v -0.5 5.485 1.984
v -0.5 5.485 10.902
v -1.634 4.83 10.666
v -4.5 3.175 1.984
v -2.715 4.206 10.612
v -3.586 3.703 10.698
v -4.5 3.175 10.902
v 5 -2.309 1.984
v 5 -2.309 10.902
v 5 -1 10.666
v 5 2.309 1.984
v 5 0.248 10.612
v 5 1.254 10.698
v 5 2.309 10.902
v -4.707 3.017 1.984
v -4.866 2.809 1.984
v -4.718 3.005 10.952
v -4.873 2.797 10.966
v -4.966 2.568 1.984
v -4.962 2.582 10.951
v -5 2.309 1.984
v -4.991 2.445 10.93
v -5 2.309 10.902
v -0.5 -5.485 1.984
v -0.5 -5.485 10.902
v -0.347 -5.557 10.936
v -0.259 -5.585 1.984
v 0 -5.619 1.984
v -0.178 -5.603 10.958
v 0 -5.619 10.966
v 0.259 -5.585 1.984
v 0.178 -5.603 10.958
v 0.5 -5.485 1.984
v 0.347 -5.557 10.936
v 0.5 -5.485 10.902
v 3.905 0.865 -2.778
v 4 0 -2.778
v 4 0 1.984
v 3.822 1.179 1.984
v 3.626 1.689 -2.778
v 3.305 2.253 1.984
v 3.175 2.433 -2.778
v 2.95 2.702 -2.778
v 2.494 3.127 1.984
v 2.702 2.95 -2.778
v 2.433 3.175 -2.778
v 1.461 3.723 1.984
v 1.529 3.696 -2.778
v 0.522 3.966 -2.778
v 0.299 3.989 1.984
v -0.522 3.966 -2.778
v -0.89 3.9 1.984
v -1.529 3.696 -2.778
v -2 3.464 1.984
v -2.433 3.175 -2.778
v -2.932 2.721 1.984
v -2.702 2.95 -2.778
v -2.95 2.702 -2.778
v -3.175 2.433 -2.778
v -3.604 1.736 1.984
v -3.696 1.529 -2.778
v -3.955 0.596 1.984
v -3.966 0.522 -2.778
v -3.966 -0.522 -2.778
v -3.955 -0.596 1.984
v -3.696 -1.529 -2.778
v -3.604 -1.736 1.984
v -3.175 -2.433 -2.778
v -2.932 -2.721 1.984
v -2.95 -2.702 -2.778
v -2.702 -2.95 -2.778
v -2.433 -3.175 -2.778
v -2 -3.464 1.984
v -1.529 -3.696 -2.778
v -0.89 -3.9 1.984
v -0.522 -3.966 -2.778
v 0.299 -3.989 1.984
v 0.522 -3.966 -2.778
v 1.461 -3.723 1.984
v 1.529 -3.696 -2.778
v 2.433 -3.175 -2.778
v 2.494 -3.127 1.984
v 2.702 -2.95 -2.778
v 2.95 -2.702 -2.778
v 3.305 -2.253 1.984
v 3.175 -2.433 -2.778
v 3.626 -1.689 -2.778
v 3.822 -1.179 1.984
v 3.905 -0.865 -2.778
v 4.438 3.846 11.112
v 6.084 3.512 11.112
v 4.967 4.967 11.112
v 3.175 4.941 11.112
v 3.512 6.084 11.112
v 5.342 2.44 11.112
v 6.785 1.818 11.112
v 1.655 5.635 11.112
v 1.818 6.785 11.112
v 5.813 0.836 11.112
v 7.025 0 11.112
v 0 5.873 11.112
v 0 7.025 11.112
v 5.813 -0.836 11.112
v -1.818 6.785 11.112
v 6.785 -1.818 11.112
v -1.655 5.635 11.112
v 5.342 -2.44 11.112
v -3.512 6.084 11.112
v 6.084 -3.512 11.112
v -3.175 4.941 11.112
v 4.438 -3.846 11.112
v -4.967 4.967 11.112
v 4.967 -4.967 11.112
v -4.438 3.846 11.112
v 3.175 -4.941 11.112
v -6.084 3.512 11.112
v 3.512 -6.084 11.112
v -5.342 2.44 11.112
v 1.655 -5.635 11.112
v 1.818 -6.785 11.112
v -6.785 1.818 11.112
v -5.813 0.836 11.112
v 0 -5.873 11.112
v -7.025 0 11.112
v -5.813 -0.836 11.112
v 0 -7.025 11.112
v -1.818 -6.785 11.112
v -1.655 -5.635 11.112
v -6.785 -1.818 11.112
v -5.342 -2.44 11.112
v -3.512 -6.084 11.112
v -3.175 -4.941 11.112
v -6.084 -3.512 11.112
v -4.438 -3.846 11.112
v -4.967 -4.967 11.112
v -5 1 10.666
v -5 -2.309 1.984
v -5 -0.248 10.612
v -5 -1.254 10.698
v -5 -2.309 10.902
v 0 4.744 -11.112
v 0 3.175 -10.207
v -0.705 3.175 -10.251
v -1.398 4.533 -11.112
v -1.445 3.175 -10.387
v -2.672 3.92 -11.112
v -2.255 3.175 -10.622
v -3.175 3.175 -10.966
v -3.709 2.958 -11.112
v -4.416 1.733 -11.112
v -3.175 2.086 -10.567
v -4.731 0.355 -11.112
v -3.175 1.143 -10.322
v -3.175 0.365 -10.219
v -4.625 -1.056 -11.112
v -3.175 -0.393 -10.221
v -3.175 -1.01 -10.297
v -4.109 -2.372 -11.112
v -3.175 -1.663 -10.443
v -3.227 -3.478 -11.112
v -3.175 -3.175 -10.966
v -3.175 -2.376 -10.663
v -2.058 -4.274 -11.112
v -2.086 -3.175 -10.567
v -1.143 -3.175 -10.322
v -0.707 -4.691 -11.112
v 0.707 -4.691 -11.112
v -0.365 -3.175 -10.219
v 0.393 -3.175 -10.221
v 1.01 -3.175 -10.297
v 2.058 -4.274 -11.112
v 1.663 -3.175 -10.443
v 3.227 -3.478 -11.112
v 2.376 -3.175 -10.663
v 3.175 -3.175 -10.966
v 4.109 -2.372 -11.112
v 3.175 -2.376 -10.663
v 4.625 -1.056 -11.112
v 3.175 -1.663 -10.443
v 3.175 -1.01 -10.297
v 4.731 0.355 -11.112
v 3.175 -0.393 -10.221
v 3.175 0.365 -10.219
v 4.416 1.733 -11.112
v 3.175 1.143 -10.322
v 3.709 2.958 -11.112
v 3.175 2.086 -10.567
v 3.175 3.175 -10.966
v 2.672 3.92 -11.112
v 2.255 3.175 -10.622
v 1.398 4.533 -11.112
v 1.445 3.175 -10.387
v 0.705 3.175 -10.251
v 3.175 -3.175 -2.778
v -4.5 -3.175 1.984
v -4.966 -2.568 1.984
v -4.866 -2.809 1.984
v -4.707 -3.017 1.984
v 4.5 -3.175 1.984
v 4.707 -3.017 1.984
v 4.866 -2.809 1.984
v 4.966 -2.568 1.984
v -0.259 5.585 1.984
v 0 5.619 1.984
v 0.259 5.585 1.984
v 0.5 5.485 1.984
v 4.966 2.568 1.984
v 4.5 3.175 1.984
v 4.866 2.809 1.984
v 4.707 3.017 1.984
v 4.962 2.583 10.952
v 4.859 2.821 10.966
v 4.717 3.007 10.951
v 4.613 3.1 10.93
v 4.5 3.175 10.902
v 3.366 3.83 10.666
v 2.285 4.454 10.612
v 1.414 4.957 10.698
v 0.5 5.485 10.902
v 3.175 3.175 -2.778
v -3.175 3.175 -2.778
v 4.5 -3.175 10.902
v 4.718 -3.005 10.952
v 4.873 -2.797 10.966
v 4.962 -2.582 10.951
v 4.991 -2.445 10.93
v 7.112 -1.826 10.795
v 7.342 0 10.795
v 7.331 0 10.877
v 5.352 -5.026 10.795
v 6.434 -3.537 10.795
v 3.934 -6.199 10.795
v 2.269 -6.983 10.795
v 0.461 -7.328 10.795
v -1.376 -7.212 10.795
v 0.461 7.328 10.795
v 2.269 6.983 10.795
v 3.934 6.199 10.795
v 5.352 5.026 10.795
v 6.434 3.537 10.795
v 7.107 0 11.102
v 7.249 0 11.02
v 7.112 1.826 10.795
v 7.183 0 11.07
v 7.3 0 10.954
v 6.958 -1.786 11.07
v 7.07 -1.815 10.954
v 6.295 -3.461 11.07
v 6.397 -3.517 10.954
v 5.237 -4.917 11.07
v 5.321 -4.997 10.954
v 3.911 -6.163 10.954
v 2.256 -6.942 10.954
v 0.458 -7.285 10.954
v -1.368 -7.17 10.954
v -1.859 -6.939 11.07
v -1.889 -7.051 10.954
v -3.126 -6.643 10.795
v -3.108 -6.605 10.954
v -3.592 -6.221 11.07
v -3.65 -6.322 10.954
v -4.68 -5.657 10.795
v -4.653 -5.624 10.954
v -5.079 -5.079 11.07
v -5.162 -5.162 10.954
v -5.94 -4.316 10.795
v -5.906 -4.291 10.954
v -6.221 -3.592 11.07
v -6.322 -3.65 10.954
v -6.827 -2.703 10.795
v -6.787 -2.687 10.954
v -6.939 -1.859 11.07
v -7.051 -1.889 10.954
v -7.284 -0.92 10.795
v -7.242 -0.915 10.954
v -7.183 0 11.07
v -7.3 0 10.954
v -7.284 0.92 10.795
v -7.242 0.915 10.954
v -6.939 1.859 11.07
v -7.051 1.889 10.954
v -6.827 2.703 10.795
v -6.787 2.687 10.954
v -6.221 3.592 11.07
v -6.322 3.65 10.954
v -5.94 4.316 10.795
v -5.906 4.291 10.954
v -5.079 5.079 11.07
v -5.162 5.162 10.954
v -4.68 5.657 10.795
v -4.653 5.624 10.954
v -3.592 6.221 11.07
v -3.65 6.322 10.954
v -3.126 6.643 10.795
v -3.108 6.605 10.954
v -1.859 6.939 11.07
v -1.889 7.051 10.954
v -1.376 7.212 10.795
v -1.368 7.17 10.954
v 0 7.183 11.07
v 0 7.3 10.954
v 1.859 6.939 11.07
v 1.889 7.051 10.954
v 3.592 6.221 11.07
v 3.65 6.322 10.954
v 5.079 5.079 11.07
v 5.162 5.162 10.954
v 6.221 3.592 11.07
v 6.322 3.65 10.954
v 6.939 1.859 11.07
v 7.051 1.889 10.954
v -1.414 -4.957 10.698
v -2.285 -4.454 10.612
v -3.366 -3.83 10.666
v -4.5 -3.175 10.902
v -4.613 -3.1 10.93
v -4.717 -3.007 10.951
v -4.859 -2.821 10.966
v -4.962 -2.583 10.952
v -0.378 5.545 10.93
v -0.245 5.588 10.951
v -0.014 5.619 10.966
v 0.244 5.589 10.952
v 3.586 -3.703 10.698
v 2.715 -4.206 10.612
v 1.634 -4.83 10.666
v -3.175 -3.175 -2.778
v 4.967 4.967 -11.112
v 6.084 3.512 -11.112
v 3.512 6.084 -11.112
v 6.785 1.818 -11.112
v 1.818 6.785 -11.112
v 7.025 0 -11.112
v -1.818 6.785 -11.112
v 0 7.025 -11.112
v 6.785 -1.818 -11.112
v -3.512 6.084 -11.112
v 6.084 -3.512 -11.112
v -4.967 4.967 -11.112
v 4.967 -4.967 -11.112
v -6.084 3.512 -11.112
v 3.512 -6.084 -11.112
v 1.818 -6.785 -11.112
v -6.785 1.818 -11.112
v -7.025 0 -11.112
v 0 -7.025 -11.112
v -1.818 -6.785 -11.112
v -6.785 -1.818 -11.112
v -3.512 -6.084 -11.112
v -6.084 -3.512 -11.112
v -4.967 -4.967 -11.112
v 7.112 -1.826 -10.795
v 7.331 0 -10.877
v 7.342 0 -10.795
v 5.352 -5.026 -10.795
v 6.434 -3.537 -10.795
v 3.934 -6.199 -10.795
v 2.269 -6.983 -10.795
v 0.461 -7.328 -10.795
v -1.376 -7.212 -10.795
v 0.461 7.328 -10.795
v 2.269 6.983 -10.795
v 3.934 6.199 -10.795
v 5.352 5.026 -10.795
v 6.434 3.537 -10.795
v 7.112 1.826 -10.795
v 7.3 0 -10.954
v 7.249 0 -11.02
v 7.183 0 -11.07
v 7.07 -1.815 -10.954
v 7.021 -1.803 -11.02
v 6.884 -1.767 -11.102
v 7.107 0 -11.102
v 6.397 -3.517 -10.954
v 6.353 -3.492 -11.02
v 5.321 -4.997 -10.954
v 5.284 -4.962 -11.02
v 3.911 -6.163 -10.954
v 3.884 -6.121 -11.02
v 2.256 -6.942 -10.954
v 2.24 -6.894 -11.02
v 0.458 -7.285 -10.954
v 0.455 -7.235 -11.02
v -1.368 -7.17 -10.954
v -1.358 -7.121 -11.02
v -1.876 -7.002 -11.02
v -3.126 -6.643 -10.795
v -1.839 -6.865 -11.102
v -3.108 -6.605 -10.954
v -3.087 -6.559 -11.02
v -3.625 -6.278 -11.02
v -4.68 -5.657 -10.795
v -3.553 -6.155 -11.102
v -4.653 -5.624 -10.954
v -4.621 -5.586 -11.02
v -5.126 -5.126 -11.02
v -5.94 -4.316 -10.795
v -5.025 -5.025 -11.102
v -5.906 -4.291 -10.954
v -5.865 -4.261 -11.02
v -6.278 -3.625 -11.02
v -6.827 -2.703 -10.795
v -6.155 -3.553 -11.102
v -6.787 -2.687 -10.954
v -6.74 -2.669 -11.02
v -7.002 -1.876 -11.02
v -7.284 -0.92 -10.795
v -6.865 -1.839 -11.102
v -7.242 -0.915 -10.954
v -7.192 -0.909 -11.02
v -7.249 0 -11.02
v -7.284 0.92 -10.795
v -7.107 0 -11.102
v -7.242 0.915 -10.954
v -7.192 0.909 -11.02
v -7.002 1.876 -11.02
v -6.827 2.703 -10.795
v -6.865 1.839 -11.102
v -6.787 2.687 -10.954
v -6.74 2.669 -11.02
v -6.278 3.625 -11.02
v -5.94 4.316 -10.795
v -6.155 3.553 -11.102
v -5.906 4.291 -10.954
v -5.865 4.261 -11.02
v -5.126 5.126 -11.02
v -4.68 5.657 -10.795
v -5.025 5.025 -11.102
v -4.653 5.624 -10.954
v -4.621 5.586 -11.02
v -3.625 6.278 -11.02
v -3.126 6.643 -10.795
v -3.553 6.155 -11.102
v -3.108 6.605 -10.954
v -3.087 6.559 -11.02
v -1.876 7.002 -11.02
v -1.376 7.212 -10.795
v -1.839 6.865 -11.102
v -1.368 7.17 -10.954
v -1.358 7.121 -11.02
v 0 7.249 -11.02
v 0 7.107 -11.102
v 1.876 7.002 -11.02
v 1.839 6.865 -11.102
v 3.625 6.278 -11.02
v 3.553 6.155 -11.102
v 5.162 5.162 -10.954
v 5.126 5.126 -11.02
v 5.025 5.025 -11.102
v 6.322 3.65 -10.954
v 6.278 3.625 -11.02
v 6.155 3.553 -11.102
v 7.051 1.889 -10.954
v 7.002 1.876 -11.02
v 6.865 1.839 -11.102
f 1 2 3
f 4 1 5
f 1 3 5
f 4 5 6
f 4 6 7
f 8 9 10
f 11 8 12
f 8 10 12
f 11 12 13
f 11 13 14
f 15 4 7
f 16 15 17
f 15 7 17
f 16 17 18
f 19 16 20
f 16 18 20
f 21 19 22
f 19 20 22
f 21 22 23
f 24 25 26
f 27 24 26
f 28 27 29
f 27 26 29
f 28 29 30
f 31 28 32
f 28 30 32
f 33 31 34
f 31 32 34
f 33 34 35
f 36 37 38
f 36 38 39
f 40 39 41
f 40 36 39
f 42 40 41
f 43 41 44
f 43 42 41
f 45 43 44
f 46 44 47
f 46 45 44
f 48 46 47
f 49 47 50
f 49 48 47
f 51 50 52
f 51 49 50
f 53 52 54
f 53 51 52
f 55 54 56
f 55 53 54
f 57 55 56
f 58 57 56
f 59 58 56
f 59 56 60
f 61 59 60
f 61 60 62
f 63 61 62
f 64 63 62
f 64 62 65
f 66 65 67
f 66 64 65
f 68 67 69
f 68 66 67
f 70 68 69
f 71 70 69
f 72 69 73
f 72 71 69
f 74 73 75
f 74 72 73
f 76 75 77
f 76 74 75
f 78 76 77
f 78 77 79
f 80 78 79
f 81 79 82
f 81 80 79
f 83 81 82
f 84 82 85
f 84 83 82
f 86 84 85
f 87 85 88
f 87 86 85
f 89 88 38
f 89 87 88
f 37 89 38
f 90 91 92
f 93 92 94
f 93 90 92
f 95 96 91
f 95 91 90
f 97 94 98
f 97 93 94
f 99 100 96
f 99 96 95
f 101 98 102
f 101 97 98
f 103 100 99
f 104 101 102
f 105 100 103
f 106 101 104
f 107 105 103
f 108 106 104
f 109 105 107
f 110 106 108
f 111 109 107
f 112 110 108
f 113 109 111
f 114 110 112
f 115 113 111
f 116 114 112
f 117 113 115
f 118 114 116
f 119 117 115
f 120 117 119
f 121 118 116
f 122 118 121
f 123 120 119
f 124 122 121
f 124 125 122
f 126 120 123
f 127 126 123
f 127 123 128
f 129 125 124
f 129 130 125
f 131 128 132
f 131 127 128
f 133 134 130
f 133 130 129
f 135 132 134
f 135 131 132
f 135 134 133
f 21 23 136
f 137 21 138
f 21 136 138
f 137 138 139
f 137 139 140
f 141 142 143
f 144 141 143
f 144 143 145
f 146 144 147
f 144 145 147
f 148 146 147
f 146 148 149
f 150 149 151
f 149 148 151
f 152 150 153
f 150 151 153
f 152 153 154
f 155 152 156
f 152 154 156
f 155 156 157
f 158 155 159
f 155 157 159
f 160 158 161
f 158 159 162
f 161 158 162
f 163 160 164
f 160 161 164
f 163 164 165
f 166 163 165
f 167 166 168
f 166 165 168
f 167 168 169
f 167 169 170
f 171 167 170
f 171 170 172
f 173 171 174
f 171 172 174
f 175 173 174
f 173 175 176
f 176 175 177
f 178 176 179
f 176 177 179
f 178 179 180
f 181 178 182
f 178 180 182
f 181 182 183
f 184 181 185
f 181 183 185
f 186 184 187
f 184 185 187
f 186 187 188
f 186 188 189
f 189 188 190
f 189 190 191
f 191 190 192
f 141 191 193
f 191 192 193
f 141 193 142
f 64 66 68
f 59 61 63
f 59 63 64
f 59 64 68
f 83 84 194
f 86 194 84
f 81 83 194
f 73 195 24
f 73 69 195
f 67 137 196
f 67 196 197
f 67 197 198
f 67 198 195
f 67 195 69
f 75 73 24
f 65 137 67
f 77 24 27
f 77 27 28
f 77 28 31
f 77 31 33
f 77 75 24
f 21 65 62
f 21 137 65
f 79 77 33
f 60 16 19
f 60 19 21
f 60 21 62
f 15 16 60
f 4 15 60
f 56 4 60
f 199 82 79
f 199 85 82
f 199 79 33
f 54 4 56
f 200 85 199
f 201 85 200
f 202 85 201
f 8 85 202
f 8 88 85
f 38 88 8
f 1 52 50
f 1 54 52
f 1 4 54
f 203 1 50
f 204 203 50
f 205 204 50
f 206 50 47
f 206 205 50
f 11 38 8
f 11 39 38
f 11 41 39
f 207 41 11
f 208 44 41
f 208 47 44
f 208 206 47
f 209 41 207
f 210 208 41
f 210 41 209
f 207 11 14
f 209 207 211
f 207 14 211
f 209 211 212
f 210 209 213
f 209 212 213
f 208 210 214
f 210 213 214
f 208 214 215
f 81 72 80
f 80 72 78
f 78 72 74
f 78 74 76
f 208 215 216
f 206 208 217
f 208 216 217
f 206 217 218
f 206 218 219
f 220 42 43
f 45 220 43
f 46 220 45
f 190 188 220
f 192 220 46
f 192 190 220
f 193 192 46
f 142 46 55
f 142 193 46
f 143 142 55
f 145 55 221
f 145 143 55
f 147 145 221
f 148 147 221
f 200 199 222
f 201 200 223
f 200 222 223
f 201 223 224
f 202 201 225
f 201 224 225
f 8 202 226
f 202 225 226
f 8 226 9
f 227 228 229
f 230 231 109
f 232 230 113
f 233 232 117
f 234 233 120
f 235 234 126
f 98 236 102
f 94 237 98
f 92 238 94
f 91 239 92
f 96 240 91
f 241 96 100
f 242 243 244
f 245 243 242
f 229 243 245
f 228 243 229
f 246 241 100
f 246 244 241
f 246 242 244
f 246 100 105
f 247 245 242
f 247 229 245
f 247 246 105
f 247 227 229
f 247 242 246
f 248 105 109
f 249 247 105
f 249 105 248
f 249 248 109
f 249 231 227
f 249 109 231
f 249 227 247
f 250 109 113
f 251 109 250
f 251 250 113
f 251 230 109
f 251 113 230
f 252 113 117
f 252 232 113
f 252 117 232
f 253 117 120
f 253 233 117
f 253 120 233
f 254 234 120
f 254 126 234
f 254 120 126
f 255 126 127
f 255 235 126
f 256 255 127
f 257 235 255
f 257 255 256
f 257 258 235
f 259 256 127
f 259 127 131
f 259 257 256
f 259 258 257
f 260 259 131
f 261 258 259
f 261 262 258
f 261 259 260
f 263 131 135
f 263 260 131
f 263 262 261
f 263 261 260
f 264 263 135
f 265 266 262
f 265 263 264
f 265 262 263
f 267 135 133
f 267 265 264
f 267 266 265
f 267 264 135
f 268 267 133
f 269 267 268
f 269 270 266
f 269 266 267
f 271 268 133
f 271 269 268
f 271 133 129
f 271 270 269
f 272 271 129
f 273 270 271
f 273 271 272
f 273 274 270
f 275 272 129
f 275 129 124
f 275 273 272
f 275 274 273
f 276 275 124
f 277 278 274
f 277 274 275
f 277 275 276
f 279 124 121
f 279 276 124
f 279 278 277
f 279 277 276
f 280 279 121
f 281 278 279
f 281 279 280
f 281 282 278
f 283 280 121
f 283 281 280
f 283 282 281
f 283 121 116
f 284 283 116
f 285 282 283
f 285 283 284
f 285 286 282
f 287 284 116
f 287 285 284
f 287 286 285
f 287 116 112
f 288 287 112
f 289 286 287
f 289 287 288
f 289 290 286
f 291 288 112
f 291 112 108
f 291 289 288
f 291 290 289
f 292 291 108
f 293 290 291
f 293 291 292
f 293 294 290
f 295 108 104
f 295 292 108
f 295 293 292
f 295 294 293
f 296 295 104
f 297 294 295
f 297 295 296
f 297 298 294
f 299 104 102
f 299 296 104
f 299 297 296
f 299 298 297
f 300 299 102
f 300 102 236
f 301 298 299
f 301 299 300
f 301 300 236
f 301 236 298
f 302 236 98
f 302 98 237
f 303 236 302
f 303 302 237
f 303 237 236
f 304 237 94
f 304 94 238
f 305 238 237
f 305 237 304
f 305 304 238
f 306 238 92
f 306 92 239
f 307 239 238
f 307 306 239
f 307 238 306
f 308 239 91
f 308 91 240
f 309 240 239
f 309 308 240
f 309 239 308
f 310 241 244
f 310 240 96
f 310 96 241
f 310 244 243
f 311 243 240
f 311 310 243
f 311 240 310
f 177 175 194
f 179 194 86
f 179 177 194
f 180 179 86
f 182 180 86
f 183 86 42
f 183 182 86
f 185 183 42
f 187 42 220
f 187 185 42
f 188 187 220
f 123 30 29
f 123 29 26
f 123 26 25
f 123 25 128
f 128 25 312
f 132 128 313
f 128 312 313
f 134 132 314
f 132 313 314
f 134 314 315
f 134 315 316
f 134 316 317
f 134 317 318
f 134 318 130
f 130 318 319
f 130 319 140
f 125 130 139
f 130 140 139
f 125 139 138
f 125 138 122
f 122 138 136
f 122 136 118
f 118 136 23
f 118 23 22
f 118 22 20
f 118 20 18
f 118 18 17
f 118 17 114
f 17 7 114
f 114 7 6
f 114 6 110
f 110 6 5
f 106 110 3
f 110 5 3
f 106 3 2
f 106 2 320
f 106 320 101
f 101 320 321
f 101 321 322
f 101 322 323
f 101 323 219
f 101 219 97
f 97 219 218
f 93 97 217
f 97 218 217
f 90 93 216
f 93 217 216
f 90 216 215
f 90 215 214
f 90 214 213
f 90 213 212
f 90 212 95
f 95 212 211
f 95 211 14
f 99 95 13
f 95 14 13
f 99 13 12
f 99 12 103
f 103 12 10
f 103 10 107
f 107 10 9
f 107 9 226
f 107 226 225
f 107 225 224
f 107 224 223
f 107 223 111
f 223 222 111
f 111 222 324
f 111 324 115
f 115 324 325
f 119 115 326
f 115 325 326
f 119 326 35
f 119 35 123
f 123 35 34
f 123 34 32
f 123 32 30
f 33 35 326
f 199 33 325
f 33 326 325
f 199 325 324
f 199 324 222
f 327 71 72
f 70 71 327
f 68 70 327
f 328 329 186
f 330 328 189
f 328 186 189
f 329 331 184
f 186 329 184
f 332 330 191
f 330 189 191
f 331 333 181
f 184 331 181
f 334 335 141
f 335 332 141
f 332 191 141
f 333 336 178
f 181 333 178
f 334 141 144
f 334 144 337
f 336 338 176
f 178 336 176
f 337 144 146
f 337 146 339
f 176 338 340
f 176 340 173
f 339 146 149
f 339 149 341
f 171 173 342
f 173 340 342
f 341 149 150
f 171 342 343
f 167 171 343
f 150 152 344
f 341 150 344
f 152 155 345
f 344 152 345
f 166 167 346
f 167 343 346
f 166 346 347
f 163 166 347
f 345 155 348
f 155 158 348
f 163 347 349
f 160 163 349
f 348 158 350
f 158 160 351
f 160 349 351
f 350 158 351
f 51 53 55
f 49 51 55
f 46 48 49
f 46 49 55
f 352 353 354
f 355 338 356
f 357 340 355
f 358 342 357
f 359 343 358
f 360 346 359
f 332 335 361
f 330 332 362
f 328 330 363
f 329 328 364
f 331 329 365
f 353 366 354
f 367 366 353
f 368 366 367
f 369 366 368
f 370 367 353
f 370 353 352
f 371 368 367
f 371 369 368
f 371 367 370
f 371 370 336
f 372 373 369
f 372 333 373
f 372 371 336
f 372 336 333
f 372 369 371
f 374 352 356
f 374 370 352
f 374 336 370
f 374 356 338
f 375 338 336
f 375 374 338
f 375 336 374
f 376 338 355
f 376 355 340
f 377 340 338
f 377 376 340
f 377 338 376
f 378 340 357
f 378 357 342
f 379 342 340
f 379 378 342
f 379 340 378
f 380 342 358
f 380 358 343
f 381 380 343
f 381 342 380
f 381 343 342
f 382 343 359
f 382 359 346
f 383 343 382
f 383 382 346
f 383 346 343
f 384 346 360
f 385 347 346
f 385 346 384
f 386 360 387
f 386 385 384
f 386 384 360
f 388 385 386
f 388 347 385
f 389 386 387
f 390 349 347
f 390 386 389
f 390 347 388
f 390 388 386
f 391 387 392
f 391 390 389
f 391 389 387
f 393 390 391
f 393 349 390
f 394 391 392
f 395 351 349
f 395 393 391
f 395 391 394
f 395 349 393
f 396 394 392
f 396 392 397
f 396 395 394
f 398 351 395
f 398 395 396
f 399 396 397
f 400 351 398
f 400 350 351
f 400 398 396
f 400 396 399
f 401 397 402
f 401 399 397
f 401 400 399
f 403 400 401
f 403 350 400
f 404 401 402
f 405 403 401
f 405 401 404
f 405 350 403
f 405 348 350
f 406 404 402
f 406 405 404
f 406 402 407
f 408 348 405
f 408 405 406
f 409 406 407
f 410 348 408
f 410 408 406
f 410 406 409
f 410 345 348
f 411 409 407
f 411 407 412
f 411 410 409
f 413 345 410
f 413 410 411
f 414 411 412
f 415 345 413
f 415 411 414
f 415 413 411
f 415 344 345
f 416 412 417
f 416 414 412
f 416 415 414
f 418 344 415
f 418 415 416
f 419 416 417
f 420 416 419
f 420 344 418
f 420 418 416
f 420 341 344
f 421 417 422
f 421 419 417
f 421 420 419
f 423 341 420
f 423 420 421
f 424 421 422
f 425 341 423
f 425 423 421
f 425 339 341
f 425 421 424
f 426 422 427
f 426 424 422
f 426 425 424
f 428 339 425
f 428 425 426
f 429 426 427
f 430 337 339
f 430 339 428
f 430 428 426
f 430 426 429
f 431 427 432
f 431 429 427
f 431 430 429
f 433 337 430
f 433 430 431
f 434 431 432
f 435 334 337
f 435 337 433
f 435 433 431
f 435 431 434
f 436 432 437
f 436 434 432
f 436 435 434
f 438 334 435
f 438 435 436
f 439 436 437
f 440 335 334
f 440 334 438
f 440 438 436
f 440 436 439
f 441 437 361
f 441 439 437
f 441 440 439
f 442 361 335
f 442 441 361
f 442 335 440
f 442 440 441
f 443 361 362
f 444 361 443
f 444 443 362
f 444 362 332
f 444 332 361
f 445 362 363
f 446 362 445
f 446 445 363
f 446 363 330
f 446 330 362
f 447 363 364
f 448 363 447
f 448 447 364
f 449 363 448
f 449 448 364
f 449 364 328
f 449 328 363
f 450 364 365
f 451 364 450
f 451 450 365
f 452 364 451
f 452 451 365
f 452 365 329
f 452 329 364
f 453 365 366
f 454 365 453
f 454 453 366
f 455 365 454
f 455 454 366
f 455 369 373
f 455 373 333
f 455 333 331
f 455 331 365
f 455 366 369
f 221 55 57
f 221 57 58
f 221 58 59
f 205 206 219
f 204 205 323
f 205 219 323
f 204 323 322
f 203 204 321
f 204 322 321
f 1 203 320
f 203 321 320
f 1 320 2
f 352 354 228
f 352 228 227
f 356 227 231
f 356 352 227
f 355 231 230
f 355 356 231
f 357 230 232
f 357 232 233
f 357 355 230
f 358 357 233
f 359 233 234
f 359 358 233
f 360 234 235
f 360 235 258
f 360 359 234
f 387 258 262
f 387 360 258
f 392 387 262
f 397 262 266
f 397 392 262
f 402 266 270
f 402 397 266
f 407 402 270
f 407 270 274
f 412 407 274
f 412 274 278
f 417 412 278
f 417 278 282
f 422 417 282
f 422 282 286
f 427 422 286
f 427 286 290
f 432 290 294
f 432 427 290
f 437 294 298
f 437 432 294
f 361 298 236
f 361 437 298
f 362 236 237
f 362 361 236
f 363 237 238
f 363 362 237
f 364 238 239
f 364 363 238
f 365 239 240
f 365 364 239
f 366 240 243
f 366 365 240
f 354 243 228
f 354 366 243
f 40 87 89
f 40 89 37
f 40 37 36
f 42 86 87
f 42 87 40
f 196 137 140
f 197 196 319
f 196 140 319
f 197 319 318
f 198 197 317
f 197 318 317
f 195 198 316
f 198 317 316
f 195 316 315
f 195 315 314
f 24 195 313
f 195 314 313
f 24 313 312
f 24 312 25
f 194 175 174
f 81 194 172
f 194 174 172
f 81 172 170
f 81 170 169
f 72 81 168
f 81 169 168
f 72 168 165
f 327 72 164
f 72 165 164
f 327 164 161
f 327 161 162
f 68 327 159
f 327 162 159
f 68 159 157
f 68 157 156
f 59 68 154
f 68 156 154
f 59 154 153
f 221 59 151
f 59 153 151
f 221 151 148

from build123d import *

# Parameters (mm, degrees)
SKETCH4_W          = 22.225
SKETCH4_H          = 7.3421875
CUT_EXTRUDE1_DEPTH = 9.128125
CUT_EXTRUDE3_START = -4.7625
SKETCH7_R          = 4
CUT_EXTRUDE3_DEPTH = 4.7625
SKETCH9_W          = 6.35
SKETCH9_H          = 6.35
CUT_EXTRUDE5_DEPTH = 8.334375
FILLET1_R          = 0.3175


with BuildPart() as part:
    # Sketch4 → Revolve1 (revolve)
    with BuildSketch(Plane(origin=(0, 0, 0), x_dir=(0, 0, -1), z_dir=(1, 0, 0)), mode=Mode.PRIVATE) as revolve1_sk:
        with Locations((0, 3.67109375)):
            Rectangle(SKETCH4_W, SKETCH4_H)
    revolve(revolve1_sk.sketch.rotate(Axis((0, 0, 11.1125), (0, 0, -1)), 90), axis=Axis((0, 0, 11.1125), (0, 0, -1)))

    # Sketch5 → Cut-Extrude1 (cut)
    with BuildSketch(Plane.XY.offset(11.1125)):
        with BuildLine():
            Line((-5, 2.309401077), (-5, -2.309401077))
            ThreePointArc((-5, -2.309401077), (-4.866025404, -2.809401077), (-4.5, -3.175426481))
            Line((-4.5, -3.175426481), (-0.5, -5.484827557))
            ThreePointArc((-0.5, -5.484827557), (0, -5.618802154), (0.5, -5.484827557))
            Line((0.5, -5.484827557), (4.5, -3.175426481))
            ThreePointArc((4.5, -3.175426481), (4.866025404, -2.809401077), (5, -2.309401077))
            Line((5, -2.309401077), (5, 2.309401077))
            ThreePointArc((5, 2.309401077), (4.866025404, 2.809401077), (4.5, 3.175426481))
            Line((4.5, 3.175426481), (0.5, 5.484827557))
            ThreePointArc((0.5, 5.484827557), (0, 5.618802154), (-0.5, 5.484827557))
            Line((-0.5, 5.484827557), (-4.5, 3.175426481))
            ThreePointArc((-4.5, 3.175426481), (-4.866025404, 2.809401077), (-5, 2.309401077))
        make_face()
    extrude(amount=-CUT_EXTRUDE1_DEPTH, mode=Mode.SUBTRACT)

    # Sketch7 → Cut-Extrude3 (cut)
    with BuildSketch(Plane.XY.offset(1.984375).offset(CUT_EXTRUDE3_START)):
        Circle(SKETCH7_R)
    extrude(amount=CUT_EXTRUDE3_DEPTH, mode=Mode.SUBTRACT)

    # Sketch9 → Cut-Extrude5 (cut)
    with BuildSketch(Plane(origin=(0, 0, -11.1125), x_dir=(-1, 0, 0), z_dir=(0, 0, -1))):
        Rectangle(SKETCH9_W, SKETCH9_H)
    extrude(amount=-CUT_EXTRUDE5_DEPTH, mode=Mode.SUBTRACT)

    # Cut-Extrude6 cone 1 section (through the dimple's axis) → Cut-Extrude6 (revolve, cut)
    with BuildSketch(Plane(origin=(0, 0, -11.1125), x_dir=(0, 1, 0), z_dir=(1, 0, 0))):
        Polygon((0, 0), (4.744128061, 0), (0, 2.739023613), align=None)
    revolve(axis=Axis((0, 0, -11.1125), (0, 0, 1)), mode=Mode.SUBTRACT)

    # Fillet1
    fillet1_edges = [part.edges().sort_by_distance(p)[0] for p in [
        (-7.3421875, 0, -11.1125),
        (-7.3421875, 0, 11.1125),
    ]]
    fillet(fillet1_edges, radius=FILLET1_R)

    # Cut-Extrude9 cone 1 section (through the dimple's axis) → Cut-Extrude9 (revolve, cut)
    with BuildSketch(Plane(origin=(0, 0, 11.1125), x_dir=(0, -1, 0), z_dir=(1, 0, 0))):
        Polygon((0, 0), (5.872802154, 0), (0, 3.390663904), align=None)
    revolve(axis=Axis((0, 0, 11.1125), (0, 0, -1)), mode=Mode.SUBTRACT)


solid = part.part
